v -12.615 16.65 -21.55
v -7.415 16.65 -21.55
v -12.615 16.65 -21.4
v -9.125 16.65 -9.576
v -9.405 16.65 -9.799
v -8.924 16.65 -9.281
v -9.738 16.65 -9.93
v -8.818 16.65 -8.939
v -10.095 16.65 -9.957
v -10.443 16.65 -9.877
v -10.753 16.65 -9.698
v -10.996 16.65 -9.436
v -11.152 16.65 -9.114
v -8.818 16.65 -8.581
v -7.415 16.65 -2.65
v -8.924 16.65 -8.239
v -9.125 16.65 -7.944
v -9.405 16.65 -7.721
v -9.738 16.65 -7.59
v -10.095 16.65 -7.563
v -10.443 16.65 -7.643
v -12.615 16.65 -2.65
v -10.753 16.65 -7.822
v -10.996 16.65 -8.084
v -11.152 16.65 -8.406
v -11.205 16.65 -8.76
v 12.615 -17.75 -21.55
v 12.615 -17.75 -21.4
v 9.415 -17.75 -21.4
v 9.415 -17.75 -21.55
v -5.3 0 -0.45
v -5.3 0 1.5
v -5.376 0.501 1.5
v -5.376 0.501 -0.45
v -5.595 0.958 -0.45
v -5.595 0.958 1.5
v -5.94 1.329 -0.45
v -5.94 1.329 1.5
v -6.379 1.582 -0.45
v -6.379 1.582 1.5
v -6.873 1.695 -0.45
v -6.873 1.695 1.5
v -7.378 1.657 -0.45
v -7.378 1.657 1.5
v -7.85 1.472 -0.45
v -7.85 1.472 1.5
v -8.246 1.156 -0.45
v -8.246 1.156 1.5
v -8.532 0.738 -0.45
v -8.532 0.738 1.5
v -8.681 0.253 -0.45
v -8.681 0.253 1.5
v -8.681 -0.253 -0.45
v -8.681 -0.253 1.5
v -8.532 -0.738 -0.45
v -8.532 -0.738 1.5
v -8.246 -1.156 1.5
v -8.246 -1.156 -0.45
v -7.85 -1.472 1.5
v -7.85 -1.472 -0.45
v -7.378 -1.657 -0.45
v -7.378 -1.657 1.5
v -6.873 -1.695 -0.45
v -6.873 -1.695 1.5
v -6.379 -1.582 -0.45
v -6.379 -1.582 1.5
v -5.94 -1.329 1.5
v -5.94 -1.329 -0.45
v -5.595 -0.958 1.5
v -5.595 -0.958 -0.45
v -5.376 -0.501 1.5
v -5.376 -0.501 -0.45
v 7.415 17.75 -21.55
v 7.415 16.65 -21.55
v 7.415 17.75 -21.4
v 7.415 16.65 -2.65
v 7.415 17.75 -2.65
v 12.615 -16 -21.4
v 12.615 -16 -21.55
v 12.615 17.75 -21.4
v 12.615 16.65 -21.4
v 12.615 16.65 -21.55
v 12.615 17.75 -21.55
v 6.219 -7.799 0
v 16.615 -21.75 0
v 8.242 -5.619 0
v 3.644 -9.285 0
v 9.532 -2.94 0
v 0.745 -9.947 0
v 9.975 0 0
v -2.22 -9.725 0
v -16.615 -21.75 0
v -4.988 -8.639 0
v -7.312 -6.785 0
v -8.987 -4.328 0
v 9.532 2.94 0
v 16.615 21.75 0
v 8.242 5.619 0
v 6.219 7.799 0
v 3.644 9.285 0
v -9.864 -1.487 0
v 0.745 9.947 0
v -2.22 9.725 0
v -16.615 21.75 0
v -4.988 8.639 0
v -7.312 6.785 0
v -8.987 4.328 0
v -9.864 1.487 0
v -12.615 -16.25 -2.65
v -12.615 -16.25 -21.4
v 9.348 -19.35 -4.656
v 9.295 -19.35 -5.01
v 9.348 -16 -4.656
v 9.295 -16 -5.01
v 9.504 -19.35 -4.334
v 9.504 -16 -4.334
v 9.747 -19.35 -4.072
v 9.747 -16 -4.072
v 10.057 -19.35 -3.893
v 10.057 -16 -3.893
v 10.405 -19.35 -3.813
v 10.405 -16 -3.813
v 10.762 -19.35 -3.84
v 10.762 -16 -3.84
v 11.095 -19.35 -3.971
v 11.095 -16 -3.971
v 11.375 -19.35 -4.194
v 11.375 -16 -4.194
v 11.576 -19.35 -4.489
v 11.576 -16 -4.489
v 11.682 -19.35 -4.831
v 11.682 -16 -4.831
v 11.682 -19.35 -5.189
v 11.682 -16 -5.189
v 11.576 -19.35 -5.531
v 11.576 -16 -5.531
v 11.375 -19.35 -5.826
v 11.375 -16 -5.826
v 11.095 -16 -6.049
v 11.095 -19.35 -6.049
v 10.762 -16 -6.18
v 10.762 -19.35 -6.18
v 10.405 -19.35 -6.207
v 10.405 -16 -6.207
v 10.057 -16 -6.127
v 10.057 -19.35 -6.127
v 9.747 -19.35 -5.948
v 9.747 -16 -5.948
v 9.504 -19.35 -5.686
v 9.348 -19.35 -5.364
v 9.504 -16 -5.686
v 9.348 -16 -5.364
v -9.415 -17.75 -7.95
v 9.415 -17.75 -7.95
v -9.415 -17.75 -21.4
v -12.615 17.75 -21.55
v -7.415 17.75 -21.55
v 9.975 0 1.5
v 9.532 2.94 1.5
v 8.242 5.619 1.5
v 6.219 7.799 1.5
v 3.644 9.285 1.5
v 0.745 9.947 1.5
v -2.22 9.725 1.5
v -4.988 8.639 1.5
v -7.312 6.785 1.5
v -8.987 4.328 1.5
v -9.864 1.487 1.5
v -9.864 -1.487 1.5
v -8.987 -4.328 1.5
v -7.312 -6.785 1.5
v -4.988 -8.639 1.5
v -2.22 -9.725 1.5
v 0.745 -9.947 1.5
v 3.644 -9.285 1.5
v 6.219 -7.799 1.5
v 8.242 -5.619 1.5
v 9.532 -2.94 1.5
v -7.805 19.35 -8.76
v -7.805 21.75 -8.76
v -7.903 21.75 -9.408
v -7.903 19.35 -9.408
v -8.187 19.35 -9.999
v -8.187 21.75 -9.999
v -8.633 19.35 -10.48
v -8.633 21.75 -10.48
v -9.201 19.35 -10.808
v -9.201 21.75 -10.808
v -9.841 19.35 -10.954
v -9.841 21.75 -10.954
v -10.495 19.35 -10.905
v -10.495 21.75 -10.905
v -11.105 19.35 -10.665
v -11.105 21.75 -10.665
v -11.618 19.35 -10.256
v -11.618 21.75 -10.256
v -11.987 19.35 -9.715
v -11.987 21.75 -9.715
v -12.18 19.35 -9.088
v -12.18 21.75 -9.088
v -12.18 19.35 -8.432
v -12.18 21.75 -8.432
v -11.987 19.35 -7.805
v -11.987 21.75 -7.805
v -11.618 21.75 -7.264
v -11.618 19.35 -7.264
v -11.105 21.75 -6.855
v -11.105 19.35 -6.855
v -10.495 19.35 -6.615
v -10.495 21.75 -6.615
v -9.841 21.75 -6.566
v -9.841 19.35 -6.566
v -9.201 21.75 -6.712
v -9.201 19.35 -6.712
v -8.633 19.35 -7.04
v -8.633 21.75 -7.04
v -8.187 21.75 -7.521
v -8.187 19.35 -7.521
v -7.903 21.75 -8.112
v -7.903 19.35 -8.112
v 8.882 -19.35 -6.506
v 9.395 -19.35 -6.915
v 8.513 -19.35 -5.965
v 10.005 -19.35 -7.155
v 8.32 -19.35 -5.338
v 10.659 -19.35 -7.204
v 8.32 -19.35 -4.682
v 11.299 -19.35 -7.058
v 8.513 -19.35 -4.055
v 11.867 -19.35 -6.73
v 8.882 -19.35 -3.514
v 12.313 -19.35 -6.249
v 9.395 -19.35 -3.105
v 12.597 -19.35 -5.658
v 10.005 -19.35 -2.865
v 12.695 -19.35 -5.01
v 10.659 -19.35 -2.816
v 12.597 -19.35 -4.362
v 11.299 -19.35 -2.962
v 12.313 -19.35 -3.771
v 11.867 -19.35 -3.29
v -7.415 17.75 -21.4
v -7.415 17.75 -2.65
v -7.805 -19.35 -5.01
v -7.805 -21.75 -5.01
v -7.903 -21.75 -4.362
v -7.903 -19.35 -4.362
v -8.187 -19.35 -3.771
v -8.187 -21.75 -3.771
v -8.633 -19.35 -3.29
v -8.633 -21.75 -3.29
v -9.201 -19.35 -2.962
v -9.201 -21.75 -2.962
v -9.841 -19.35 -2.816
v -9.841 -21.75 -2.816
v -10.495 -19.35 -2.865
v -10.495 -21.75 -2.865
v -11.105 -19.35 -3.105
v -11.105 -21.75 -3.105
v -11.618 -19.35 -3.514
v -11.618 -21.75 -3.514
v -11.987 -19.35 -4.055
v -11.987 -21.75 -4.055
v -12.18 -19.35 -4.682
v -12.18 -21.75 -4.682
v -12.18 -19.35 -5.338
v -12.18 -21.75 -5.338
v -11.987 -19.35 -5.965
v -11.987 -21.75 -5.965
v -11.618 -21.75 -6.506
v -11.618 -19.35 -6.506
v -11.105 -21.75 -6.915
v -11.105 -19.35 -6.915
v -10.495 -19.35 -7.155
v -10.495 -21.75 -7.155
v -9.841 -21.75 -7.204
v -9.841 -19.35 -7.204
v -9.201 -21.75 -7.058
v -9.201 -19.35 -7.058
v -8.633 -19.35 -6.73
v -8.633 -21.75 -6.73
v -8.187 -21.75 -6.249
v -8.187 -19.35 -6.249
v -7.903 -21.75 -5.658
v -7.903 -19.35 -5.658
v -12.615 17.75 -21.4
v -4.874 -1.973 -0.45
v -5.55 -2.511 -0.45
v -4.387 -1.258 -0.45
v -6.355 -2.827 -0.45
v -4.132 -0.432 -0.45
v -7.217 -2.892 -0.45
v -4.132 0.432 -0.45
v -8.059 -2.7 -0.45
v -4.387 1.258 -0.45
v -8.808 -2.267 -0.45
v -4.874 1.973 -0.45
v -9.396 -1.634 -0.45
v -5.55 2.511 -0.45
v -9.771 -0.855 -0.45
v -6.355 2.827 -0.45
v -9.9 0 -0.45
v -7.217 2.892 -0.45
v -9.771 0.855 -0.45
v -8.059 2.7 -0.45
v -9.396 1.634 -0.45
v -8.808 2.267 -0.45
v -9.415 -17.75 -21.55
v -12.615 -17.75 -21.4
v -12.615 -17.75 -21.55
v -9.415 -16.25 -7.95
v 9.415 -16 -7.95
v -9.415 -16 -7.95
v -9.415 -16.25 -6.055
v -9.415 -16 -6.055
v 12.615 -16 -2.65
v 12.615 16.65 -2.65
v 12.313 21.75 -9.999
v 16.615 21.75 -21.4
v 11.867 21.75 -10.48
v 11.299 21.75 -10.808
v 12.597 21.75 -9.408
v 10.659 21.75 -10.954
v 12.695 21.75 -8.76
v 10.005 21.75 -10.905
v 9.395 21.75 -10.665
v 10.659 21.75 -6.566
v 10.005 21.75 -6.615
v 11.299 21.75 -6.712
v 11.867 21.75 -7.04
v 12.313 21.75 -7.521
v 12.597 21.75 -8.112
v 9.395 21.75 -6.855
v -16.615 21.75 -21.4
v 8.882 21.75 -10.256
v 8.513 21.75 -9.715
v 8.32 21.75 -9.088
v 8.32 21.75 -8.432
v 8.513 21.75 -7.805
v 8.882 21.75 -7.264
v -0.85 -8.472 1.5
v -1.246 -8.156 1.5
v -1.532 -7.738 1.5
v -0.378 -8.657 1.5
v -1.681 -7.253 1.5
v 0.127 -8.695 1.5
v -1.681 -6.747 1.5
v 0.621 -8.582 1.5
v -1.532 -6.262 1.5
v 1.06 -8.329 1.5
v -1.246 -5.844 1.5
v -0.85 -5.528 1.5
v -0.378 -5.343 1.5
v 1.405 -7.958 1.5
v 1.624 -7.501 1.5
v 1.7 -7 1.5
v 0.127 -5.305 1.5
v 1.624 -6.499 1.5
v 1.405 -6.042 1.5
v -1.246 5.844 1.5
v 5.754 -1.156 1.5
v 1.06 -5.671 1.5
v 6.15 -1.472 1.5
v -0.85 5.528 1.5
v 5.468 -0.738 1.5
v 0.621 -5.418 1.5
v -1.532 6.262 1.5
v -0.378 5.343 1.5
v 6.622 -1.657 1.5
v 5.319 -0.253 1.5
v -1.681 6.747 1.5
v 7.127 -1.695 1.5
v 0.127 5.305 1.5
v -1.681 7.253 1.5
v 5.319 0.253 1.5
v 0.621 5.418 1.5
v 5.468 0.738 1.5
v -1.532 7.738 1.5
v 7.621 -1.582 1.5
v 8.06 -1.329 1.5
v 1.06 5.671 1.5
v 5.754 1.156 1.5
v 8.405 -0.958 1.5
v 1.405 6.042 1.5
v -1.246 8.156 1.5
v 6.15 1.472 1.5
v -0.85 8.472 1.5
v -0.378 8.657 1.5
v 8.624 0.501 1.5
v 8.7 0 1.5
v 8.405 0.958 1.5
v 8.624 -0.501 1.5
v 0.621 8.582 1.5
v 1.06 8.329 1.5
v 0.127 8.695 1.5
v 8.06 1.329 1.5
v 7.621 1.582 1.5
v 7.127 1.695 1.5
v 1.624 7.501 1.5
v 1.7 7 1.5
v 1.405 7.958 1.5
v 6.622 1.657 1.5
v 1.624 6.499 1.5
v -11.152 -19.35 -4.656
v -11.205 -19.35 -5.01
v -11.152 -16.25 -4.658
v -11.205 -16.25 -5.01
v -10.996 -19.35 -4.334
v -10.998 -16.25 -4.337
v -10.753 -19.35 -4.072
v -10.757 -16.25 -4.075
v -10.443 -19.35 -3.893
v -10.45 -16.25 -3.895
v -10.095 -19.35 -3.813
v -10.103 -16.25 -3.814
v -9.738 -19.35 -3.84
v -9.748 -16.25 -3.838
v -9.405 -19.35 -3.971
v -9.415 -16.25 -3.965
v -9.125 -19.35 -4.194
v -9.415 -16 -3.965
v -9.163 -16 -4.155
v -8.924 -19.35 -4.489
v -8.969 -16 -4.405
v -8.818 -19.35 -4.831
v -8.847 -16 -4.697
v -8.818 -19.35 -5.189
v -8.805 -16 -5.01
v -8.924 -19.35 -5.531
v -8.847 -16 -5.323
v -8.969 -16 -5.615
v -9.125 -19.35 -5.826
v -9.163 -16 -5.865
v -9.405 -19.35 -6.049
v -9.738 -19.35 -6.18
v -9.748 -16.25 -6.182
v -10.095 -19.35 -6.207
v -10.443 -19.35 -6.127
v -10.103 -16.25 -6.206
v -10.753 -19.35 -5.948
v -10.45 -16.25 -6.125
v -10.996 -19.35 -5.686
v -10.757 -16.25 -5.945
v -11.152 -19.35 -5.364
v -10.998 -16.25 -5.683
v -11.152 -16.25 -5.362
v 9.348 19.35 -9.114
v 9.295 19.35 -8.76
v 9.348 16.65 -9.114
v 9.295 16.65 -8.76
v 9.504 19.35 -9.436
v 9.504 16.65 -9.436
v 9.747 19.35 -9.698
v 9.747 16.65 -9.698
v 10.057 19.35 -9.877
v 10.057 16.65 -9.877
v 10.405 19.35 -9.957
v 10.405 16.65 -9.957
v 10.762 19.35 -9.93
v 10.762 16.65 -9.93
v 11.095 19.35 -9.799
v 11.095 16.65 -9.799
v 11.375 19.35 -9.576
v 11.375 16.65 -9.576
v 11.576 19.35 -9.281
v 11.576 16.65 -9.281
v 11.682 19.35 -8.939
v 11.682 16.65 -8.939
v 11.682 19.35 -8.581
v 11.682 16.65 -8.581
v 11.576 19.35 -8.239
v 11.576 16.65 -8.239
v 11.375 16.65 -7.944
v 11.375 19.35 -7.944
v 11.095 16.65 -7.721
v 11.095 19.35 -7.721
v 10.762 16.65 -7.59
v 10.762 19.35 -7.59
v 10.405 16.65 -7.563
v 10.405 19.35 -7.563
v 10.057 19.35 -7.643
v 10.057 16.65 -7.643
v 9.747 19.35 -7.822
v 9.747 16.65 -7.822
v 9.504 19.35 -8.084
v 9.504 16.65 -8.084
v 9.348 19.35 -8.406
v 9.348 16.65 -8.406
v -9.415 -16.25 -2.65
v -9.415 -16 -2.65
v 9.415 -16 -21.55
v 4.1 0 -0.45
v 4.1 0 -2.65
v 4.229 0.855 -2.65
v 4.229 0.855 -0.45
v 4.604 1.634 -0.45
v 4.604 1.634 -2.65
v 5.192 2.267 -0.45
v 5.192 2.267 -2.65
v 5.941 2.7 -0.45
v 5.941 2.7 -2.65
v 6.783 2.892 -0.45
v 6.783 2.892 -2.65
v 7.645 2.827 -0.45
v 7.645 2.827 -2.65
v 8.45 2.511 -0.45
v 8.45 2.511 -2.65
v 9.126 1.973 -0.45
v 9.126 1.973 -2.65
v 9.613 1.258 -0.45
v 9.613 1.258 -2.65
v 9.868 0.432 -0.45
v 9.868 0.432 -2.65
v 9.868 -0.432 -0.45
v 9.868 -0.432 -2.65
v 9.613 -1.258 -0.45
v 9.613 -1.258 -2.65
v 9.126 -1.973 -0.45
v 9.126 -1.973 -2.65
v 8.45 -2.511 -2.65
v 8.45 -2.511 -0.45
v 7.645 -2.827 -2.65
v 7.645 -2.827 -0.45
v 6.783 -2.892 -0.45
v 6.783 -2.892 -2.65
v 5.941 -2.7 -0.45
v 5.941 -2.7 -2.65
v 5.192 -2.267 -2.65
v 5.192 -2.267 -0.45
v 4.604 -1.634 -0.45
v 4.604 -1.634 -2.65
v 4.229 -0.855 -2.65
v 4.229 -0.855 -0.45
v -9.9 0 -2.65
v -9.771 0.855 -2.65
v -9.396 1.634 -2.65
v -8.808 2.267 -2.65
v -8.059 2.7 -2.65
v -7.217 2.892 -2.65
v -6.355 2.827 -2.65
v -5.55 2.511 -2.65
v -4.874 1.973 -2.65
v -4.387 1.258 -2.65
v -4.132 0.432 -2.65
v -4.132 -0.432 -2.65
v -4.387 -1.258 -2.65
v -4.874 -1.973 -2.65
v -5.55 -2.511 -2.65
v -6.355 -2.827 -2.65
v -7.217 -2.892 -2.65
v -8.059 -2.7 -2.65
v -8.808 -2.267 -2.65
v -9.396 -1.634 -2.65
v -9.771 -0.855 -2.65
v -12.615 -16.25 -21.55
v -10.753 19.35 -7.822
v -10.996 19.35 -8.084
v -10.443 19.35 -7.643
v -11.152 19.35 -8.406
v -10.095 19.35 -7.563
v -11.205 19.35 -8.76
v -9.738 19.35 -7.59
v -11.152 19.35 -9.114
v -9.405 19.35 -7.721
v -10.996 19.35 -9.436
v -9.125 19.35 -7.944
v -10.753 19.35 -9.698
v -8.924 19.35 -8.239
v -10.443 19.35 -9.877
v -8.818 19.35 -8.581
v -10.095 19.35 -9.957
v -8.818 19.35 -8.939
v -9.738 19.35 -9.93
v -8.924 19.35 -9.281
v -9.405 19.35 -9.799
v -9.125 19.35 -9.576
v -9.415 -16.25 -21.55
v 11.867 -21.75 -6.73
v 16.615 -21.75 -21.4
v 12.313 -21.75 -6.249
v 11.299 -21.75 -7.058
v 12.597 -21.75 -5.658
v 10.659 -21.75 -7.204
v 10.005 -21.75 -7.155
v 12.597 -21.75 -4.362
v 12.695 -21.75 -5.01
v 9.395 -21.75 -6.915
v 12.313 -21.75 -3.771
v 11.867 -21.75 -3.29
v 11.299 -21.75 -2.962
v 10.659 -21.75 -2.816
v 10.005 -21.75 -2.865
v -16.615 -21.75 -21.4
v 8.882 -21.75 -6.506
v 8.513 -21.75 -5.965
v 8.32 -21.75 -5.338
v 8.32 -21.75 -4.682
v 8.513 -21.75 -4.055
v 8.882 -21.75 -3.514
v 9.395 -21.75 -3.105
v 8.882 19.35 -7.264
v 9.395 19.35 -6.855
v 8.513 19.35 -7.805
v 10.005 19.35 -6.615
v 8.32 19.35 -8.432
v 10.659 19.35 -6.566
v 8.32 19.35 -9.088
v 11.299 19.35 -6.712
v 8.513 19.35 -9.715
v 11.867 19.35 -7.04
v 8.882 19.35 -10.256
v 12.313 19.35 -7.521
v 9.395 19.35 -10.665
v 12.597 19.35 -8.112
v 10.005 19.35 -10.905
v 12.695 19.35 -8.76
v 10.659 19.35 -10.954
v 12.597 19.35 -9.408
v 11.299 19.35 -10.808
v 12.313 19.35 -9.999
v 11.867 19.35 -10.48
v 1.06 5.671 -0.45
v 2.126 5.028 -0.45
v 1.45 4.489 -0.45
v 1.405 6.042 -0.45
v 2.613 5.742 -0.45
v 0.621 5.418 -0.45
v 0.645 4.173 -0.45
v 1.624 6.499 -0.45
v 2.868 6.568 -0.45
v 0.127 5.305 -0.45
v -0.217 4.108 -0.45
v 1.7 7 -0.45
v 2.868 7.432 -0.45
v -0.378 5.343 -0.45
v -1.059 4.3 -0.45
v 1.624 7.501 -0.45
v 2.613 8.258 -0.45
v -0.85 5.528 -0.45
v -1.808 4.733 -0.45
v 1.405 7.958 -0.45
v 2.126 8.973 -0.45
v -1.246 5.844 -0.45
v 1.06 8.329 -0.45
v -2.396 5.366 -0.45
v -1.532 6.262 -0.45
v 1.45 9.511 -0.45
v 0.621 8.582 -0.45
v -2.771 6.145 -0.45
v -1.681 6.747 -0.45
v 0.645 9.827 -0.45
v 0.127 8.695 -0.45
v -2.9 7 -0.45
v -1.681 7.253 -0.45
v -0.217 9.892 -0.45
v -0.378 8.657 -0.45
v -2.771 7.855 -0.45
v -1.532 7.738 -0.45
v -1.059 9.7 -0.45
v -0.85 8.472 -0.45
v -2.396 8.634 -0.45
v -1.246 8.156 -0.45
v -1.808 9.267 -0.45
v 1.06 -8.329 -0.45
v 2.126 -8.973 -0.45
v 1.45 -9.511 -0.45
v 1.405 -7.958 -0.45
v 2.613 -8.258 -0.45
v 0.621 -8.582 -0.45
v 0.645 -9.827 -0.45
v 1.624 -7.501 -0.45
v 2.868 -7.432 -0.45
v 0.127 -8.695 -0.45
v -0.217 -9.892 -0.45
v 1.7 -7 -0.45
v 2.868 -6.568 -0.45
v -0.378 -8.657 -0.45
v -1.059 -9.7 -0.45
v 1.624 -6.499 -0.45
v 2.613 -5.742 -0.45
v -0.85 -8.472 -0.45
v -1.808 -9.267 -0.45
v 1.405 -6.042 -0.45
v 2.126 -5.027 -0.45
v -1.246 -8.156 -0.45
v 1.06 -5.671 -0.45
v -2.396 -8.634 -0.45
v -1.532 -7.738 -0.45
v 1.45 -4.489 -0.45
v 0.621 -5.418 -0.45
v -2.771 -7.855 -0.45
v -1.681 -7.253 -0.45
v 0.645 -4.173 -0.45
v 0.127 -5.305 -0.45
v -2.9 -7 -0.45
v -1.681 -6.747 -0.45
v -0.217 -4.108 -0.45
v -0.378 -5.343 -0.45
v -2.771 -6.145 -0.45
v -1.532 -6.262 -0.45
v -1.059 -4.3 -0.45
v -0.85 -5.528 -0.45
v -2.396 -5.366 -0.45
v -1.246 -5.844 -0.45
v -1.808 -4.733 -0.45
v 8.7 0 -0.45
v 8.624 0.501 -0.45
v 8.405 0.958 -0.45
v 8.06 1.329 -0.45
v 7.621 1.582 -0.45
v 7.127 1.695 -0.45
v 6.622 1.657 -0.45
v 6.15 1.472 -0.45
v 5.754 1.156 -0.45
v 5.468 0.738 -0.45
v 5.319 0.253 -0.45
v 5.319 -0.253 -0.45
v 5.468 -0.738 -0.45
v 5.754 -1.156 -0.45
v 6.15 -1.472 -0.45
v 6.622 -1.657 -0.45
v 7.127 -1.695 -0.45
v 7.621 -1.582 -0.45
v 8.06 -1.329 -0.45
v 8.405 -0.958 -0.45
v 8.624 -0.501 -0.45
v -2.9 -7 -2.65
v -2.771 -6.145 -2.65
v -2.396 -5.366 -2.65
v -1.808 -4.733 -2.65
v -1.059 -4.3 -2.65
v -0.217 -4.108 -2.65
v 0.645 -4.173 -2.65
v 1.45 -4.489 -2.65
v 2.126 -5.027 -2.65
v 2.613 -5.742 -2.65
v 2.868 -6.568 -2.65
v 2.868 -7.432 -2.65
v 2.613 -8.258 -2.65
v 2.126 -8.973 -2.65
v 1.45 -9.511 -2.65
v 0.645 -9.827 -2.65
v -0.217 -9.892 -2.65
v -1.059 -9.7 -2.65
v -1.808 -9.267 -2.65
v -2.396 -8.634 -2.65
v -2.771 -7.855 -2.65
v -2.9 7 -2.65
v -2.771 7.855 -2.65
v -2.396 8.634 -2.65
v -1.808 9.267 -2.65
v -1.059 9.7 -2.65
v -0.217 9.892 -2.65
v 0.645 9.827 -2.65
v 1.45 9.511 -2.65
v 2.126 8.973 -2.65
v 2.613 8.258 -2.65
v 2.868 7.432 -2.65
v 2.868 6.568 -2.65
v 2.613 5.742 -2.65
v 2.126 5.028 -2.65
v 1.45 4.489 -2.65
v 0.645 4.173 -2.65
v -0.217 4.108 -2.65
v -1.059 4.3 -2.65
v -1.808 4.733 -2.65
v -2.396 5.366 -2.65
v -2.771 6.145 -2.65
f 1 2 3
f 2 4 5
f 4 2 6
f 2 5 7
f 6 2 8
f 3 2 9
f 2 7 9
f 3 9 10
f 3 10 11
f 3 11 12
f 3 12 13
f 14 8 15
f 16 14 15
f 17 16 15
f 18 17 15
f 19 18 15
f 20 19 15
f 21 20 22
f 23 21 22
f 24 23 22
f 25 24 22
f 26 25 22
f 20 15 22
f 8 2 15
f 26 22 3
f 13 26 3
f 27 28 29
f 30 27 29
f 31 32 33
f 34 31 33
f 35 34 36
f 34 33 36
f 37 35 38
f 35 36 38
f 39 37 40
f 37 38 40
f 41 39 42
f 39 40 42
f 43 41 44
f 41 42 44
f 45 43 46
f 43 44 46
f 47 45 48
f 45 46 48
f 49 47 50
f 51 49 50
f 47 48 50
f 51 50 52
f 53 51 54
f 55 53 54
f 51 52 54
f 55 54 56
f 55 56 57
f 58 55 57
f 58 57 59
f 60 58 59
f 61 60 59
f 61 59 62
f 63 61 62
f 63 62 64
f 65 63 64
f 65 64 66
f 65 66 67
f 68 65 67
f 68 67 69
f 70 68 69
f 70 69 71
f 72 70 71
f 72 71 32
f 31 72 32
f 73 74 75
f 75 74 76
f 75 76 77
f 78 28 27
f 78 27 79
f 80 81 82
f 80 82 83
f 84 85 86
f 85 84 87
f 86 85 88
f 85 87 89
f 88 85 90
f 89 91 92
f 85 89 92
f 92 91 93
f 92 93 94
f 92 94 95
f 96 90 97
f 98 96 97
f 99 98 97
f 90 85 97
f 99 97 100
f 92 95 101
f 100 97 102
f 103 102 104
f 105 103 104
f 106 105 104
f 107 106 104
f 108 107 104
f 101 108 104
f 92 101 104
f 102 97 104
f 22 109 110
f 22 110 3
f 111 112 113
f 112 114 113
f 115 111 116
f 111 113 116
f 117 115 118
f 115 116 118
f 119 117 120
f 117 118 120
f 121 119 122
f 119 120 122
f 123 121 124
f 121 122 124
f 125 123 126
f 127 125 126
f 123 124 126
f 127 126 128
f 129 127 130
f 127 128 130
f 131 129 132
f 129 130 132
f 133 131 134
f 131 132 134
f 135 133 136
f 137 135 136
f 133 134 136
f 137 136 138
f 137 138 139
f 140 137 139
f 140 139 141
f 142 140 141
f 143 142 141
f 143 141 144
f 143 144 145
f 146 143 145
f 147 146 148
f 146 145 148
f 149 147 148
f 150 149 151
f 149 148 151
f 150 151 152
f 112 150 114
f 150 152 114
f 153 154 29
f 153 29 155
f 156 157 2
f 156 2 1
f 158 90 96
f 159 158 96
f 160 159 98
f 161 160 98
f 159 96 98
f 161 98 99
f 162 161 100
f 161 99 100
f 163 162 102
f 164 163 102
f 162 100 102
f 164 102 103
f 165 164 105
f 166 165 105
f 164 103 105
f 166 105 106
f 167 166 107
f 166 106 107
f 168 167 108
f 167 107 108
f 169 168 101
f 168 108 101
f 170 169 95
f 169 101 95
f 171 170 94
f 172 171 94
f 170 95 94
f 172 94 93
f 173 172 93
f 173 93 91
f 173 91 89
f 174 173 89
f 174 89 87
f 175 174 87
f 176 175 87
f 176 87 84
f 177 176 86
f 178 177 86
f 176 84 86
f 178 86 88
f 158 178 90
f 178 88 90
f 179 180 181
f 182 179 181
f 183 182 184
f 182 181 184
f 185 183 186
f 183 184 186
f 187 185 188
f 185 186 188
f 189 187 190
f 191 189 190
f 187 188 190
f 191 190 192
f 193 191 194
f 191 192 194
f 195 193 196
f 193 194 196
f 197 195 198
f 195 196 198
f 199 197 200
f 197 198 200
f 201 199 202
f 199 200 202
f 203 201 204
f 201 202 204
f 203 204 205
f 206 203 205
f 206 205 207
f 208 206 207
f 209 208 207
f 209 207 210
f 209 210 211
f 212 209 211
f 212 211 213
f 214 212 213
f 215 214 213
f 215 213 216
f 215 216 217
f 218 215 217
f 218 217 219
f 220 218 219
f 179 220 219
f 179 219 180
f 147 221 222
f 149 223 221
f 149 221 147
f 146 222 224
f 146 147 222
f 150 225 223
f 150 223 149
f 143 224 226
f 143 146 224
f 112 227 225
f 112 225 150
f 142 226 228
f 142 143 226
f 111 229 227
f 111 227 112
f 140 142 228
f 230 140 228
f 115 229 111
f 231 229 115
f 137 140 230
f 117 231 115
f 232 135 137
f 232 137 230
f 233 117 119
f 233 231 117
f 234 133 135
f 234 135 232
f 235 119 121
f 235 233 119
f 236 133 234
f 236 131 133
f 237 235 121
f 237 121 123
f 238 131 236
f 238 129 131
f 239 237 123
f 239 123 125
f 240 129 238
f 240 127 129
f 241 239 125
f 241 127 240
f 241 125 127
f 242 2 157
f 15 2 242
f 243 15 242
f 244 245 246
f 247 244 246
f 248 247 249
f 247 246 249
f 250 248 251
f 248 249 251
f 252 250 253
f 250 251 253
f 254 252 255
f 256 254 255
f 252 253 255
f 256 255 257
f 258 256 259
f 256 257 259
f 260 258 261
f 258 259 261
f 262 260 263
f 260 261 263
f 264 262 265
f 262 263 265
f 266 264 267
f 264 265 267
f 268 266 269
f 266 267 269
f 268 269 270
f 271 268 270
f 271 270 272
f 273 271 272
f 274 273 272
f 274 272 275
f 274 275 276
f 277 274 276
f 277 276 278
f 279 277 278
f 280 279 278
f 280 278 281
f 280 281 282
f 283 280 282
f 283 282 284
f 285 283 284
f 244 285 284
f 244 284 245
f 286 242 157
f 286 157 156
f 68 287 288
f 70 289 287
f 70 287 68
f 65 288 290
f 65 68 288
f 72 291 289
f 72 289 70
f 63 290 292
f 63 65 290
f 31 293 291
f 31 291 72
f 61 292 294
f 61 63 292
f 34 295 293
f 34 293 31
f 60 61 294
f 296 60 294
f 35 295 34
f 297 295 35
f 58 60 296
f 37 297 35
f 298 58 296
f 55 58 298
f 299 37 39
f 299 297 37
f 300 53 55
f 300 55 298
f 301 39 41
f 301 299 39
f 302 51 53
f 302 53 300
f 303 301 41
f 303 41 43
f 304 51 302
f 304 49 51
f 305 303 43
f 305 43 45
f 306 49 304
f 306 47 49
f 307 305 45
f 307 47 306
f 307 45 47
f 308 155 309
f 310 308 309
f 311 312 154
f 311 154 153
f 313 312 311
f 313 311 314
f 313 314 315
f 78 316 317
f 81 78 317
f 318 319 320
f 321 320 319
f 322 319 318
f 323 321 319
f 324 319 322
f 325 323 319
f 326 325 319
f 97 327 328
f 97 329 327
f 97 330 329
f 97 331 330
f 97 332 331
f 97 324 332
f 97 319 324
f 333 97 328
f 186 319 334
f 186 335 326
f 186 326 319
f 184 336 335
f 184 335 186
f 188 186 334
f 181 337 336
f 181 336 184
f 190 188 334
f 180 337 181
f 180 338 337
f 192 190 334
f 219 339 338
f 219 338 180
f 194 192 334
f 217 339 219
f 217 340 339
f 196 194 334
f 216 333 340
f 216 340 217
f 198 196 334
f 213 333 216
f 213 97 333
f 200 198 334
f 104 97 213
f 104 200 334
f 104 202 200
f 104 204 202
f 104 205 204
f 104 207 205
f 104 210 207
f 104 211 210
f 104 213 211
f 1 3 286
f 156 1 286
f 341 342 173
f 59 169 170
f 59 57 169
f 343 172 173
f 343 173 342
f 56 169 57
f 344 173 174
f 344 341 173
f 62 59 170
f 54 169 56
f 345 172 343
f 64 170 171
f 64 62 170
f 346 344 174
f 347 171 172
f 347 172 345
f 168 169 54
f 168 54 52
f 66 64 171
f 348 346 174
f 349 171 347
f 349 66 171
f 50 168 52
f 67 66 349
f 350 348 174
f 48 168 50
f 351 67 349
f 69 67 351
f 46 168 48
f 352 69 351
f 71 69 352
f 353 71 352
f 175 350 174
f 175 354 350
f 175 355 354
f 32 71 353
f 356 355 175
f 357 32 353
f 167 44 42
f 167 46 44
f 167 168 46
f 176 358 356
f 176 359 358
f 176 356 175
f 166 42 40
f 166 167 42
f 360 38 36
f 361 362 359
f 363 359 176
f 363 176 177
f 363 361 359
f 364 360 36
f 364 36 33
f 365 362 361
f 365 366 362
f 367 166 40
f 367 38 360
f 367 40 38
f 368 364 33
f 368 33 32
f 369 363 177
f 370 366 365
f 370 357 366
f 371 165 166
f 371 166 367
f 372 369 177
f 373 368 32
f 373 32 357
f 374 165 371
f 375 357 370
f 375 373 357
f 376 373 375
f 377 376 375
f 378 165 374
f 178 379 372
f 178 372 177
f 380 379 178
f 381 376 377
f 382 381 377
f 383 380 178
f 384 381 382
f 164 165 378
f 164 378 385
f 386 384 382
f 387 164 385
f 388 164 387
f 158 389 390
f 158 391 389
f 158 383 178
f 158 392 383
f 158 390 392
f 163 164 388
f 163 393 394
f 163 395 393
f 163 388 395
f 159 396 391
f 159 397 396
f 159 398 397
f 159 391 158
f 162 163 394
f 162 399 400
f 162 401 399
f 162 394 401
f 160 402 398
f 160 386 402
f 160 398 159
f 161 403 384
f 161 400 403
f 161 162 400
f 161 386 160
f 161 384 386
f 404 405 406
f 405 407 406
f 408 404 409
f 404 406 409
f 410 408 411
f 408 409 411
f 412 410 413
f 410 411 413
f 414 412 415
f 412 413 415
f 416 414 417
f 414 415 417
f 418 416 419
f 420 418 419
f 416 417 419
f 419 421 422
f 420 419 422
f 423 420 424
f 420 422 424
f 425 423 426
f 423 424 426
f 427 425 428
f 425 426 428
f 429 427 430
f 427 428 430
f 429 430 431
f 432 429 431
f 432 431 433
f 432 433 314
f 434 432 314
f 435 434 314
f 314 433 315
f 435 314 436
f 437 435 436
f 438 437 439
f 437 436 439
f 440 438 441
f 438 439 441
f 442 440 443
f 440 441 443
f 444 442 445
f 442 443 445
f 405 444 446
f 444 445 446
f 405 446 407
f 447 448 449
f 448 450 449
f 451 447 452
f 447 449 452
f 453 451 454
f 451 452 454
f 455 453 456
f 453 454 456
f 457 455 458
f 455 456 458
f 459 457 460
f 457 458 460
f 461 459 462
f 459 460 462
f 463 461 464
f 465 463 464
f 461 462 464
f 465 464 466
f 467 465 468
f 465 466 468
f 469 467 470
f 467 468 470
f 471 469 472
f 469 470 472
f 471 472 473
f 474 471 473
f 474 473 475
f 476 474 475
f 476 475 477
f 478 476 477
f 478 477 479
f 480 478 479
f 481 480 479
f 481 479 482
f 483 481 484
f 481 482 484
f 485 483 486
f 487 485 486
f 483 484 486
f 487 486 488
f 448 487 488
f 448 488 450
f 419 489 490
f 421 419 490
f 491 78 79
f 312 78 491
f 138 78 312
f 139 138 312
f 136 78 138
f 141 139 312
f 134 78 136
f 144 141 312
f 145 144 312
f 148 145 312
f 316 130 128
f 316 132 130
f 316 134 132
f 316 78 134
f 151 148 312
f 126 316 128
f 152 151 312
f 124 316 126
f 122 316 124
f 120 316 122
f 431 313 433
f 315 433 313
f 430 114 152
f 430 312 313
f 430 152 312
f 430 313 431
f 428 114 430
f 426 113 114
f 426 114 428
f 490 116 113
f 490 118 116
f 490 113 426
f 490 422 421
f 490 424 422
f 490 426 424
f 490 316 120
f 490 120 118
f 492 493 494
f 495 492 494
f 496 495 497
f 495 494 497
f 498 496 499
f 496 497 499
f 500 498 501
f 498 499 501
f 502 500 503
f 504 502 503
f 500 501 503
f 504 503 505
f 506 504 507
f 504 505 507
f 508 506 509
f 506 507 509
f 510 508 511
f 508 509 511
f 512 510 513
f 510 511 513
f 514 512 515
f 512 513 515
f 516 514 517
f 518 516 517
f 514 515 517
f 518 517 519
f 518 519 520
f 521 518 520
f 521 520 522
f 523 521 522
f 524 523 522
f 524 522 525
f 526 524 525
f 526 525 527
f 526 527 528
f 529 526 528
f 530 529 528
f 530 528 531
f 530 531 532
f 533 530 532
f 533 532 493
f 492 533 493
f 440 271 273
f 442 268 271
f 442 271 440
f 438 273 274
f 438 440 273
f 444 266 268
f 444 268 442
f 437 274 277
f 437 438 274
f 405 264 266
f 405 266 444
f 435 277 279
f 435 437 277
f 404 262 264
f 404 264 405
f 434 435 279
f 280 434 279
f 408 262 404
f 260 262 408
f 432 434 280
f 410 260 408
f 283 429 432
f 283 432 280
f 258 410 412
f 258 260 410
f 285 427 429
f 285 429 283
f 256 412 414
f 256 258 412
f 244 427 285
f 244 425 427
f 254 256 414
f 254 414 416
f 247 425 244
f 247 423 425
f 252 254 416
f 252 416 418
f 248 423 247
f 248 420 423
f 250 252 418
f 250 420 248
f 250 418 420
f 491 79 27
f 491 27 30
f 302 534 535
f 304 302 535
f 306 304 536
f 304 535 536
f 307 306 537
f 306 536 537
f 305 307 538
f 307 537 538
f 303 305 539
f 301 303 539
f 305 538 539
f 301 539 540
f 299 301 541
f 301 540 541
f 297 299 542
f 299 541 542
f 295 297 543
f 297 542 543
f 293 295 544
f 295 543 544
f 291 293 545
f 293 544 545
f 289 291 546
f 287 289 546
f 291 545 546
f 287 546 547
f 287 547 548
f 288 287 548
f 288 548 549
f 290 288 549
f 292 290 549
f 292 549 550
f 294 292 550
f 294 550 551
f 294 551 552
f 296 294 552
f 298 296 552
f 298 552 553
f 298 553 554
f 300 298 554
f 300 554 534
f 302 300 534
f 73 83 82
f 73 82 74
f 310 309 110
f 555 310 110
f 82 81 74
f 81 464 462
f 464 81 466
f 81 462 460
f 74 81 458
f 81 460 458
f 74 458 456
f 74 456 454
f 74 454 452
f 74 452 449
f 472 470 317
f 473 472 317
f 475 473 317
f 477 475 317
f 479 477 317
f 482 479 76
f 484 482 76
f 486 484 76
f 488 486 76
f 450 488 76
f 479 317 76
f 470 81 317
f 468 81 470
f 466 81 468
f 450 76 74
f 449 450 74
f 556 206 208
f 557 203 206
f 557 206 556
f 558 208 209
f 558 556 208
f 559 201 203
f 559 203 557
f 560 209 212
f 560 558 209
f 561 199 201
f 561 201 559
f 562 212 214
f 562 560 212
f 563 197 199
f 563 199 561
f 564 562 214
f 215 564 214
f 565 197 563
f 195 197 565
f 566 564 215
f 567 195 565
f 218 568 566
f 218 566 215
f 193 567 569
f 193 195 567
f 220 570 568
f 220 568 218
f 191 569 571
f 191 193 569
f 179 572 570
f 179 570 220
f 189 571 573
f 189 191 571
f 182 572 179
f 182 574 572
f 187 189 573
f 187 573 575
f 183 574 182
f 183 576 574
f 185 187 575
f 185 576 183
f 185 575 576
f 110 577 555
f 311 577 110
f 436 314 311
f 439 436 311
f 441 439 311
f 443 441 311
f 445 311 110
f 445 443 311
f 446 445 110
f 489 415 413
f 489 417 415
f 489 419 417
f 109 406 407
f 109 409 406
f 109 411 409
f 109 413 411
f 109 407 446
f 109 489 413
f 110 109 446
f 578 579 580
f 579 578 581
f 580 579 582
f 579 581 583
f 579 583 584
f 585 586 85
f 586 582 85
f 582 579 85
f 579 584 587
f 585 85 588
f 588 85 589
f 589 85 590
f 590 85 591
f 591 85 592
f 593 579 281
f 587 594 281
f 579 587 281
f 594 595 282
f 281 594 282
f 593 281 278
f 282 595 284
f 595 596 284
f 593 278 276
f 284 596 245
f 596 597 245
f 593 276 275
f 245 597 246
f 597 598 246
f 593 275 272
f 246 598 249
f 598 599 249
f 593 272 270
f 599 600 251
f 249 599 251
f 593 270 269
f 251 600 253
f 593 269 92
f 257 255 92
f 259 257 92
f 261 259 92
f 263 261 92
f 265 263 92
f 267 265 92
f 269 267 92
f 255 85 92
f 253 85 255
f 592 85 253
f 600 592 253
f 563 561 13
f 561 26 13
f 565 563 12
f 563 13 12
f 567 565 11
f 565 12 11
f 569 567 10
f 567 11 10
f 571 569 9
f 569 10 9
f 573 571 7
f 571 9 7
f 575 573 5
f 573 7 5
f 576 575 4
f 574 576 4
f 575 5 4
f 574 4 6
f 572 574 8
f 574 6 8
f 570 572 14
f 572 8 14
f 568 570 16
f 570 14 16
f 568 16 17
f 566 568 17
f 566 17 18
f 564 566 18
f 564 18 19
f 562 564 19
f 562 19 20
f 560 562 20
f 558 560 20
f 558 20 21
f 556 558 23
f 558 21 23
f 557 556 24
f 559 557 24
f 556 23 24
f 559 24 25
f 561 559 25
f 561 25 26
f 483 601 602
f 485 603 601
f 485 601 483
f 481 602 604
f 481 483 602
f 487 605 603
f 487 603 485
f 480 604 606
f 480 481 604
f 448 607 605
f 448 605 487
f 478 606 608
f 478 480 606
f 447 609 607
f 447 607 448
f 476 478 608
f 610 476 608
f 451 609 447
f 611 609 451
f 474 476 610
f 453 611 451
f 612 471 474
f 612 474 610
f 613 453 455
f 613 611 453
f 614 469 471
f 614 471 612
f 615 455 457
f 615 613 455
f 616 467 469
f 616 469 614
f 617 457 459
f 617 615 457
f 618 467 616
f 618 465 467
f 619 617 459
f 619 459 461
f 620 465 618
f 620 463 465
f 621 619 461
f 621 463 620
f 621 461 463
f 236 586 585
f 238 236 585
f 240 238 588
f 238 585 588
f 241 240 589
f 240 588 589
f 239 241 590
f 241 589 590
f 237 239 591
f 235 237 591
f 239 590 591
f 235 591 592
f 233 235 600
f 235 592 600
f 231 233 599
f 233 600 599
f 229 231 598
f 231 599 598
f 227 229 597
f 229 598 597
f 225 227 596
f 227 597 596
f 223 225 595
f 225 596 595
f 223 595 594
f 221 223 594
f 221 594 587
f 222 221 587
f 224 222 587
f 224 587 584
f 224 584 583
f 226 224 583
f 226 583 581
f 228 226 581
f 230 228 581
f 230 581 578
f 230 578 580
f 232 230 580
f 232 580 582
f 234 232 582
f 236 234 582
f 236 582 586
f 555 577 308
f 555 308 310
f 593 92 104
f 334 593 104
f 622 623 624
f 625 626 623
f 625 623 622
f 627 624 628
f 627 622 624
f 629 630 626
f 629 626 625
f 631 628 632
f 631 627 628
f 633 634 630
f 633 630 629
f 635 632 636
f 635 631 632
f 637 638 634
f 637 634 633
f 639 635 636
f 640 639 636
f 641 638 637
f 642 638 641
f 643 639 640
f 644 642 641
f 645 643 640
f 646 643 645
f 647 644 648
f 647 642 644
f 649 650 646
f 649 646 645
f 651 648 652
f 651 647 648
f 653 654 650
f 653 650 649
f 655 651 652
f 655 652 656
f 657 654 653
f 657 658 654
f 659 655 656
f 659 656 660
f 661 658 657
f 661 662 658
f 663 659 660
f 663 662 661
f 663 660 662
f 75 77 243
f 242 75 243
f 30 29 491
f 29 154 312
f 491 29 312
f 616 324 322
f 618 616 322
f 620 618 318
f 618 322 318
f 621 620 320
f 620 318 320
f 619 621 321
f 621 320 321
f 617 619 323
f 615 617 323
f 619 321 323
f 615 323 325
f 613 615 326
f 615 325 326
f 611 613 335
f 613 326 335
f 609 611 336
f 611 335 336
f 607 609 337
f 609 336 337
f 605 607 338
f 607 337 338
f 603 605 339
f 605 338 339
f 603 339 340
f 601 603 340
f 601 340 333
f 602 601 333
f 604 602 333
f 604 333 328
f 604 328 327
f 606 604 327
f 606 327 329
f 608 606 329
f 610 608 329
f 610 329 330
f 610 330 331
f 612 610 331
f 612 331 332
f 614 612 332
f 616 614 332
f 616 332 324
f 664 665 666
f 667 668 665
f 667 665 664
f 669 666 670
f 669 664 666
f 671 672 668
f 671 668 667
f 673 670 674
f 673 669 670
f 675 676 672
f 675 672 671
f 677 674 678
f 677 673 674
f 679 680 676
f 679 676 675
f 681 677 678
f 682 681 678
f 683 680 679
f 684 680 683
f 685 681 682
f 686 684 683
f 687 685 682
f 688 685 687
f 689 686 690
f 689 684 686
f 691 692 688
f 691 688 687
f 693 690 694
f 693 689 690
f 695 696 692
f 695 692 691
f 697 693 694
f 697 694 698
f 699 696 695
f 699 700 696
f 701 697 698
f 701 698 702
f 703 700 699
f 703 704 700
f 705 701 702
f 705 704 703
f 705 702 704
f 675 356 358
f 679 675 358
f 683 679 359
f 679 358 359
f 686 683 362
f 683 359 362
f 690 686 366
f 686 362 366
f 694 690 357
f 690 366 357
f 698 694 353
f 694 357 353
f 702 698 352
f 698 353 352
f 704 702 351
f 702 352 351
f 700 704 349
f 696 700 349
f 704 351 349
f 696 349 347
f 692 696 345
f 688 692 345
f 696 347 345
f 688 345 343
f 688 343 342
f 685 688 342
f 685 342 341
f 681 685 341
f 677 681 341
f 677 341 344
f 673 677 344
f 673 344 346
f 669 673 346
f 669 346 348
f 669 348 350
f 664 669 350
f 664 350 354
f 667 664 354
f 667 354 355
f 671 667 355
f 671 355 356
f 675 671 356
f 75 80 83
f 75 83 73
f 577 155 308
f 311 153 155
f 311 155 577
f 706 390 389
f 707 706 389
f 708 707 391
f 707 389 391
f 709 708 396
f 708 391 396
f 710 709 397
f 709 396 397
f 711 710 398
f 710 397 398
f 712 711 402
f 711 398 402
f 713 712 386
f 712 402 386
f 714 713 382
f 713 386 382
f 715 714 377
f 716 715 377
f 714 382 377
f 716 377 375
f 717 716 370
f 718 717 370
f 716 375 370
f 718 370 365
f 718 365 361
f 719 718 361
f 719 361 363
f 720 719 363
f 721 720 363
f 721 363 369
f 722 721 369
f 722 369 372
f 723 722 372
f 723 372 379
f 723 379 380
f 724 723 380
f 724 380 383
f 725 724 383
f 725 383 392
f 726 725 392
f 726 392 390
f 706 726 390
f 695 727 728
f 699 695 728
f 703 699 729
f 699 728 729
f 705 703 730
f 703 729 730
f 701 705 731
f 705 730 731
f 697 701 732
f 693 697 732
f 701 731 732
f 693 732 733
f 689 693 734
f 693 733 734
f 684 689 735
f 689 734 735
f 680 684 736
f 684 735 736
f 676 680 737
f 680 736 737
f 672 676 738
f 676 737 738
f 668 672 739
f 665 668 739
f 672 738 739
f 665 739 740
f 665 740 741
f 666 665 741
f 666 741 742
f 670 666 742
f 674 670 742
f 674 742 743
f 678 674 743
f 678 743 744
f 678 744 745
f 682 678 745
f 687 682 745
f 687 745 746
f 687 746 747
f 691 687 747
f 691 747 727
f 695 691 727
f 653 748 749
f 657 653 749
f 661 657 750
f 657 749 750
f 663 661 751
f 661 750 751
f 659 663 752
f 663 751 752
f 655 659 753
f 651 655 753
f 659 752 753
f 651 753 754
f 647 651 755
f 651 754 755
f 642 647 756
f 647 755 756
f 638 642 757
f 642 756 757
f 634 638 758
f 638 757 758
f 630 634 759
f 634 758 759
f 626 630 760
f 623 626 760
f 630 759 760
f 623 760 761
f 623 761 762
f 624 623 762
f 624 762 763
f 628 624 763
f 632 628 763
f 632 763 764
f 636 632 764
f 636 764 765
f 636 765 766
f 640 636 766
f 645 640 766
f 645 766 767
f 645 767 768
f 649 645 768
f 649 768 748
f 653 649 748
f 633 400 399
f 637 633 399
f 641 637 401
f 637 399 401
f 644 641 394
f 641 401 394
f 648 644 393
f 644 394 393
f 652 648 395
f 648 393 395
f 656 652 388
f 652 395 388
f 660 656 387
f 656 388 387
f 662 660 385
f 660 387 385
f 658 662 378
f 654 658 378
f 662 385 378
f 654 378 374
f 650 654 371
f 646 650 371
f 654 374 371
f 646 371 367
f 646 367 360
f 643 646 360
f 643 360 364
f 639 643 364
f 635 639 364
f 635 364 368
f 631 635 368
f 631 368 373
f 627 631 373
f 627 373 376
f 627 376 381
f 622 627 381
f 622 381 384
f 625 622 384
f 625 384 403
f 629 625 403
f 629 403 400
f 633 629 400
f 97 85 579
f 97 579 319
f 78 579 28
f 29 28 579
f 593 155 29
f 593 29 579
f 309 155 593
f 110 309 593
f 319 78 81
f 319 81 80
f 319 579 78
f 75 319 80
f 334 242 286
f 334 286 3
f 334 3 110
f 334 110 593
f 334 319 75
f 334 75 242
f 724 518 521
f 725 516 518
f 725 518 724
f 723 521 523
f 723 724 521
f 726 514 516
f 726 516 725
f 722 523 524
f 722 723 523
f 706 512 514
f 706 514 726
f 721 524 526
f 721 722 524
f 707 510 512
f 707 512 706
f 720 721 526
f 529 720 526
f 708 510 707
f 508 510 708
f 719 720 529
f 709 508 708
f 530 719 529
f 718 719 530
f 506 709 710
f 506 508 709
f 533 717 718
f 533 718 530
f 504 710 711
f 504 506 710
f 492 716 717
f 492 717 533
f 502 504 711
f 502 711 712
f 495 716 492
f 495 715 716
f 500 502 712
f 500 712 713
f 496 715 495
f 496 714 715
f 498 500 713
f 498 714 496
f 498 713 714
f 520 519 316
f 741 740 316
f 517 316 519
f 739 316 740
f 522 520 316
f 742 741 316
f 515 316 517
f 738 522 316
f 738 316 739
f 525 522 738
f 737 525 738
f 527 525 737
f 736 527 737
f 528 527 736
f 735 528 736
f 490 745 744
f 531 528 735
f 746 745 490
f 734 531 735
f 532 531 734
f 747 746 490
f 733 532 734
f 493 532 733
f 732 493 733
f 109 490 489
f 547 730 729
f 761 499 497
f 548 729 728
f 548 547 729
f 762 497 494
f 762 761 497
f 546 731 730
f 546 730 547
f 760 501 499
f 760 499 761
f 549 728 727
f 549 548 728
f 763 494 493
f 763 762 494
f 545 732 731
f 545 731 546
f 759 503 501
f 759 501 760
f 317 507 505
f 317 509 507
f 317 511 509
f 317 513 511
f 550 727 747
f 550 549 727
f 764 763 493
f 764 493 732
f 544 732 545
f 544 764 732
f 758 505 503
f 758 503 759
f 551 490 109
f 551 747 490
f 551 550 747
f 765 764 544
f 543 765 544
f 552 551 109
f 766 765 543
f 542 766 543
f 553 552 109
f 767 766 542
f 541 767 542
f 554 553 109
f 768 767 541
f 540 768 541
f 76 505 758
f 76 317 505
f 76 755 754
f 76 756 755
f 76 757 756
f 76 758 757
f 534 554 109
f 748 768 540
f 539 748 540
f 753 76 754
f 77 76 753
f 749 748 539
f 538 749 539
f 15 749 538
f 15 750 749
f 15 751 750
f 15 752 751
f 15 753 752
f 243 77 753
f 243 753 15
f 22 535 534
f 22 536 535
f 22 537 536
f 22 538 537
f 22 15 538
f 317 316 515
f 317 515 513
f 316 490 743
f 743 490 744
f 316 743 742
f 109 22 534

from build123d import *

# Parameters (mm, degrees)
SKETCH1_R                                           = 9.975
BOSS_EXTRUDE1_DEPTH                                 = 1.5
SKETCH3_W                                           = 25.23
SKETCH3_H                                           = 35.5
BOSS_EXTRUDE4_DEPTH                                 = 2.65
SKETCH3_5_W                                         = 33.23
SKETCH3_5_H                                         = 43.5
SKETCH3_5_W_2                                       = 25.23
SKETCH3_5_H_2                                       = 35.5
BOSS_EXTRUDE5_DEPTH                                 = 21.4
SKETCH4_W                                           = 5.2
SKETCH4_H                                           = 1.1
SKETCH4_W_2                                         = 3.2
SKETCH4_H_2                                         = 1.5
SKETCH4_H_3                                         = 1.75
BOSS_EXTRUDE6_DEPTH                                 = 18.9
SKETCH6_W                                           = 18.83
SKETCH6_H                                           = 1.75
BOSS_EXTRUDE7_DEPTH                                 = 5.3
SKETCH2_R                                           = 1.6
CUT_EXTRUDE1_DEPTH                                  = 37
CBORE_FOR_M3_HEX_SOCKET_HEAD_CAP_SCREW1_D           = 3.4
CBORE_FOR_M3_HEX_SOCKET_HEAD_CAP_SCREW1_DEPTH       = 4.15
CBORE_FOR_M3_HEX_SOCKET_HEAD_CAP_SCREW1_CBORE_D     = 5.8
CBORE_FOR_M3_HEX_SOCKET_HEAD_CAP_SCREW1_CBORE_DEPTH = 2.2
CBORE_FOR_M2_HEX_SOCKET_HEAD_CAP_SCREW1_D           = 2.4
CBORE_FOR_M2_HEX_SOCKET_HEAD_CAP_SCREW1_DEPTH       = 6.5
CBORE_FOR_M2_HEX_SOCKET_HEAD_CAP_SCREW1_CBORE_D     = 4.4
CBORE_FOR_M2_HEX_SOCKET_HEAD_CAP_SCREW1_CBORE_DEPTH = 2.4
CBORE_FOR_M2_HEX_SOCKET_HEAD_CAP_SCREW1_TIP         = 0.721032743
CBORE_FOR_M2_HEX_SOCKET_HEAD_CAP_SCREW2_D           = 2.4
CBORE_FOR_M2_HEX_SOCKET_HEAD_CAP_SCREW2_DEPTH       = 6.5
CBORE_FOR_M2_HEX_SOCKET_HEAD_CAP_SCREW2_CBORE_D     = 4.4
CBORE_FOR_M2_HEX_SOCKET_HEAD_CAP_SCREW2_CBORE_DEPTH = 2.4
CBORE_FOR_M2_HEX_SOCKET_HEAD_CAP_SCREW2_TIP         = 0.721032743


with BuildPart() as part:
    # Sketch1 → Boss-Extrude1 (new body)
    with BuildSketch(Plane.XY):
        Circle(SKETCH1_R)
    extrude(amount=BOSS_EXTRUDE1_DEPTH)

    # Sketch3 → Boss-Extrude4 (add)
    with BuildSketch(Plane(origin=(0, 0, 0), x_dir=(-1, 0, 0), z_dir=(0, 0, -1))):
        Rectangle(SKETCH3_W, SKETCH3_H)
    extrude(amount=BOSS_EXTRUDE4_DEPTH)

    # Sketch3<5> → Boss-Extrude5 (add)
    with BuildSketch(Plane(origin=(0, 0, 0), x_dir=(-1, 0, 0), z_dir=(0, 0, -1))):
        Rectangle(SKETCH3_5_W, SKETCH3_5_H)
        Rectangle(SKETCH3_5_W_2, SKETCH3_5_H_2, mode=Mode.SUBTRACT)
    extrude(amount=BOSS_EXTRUDE5_DEPTH)

    # Sketch4 → Boss-Extrude6 (add)
    with BuildSketch(Plane(origin=(0, 0, -2.65), x_dir=(-1, 0, 0), z_dir=(0, 0, -1))):
        with Locations((10.015, 17.2)):
            Rectangle(SKETCH4_W, SKETCH4_H)
        with Locations((-10.015, 17.2)):
            Rectangle(SKETCH4_W, SKETCH4_H)
        with Locations((11.015, -17)):
            Rectangle(SKETCH4_W_2, SKETCH4_H_2)
        with Locations((-11.015, -16.875)):
            Rectangle(SKETCH4_W_2, SKETCH4_H_3)
    extrude(amount=BOSS_EXTRUDE6_DEPTH)

    # Sketch6 → Boss-Extrude7 (add)
    with BuildSketch(Plane(origin=(0, 0, -2.65), x_dir=(-1, 0, 0), z_dir=(0, 0, -1))):
        with Locations((0, -16.875)):
            Rectangle(SKETCH6_W, SKETCH6_H)
    extrude(amount=BOSS_EXTRUDE7_DEPTH)

    # Sketch2 → Cut-Extrude1 (cut)
    with BuildSketch(Plane.XY.offset(1.5)):
        with Locations((7, 0)):
            Circle(SKETCH2_R)
        with Locations((0, -7)):
            Circle(SKETCH2_R)
        with Locations((-7, 0)):
            Circle(SKETCH2_R)
        with Locations((0, 7)):
            Circle(SKETCH2_R)
    extrude(amount=-CUT_EXTRUDE1_DEPTH, mode=Mode.SUBTRACT)

    # CBORE for M3 Hex Socket Head Cap Screw1
    with Locations(Plane(origin=(0, 0, -2.65), x_dir=(-1, 0, 0), z_dir=(0, 0, -1))):
        with Locations((0, 7.000001873), (-7.000001873, 0), (0, -7), (7, 0)):
            CounterBoreHole(CBORE_FOR_M3_HEX_SOCKET_HEAD_CAP_SCREW1_D / 2, CBORE_FOR_M3_HEX_SOCKET_HEAD_CAP_SCREW1_CBORE_D / 2, CBORE_FOR_M3_HEX_SOCKET_HEAD_CAP_SCREW1_CBORE_DEPTH, depth=CBORE_FOR_M3_HEX_SOCKET_HEAD_CAP_SCREW1_DEPTH)

    # CBORE for M2 Hex Socket Head Cap Screw1
    with Locations(Plane.XZ.offset(21.75)):
        with Locations((-10.005, -5.01), (10.495, -5.01)):
            CounterBoreHole(CBORE_FOR_M2_HEX_SOCKET_HEAD_CAP_SCREW1_D / 2, CBORE_FOR_M2_HEX_SOCKET_HEAD_CAP_SCREW1_CBORE_D / 2, CBORE_FOR_M2_HEX_SOCKET_HEAD_CAP_SCREW1_CBORE_DEPTH, depth=CBORE_FOR_M2_HEX_SOCKET_HEAD_CAP_SCREW1_DEPTH)
            with Locations((0, 0, -(CBORE_FOR_M2_HEX_SOCKET_HEAD_CAP_SCREW1_DEPTH + CBORE_FOR_M2_HEX_SOCKET_HEAD_CAP_SCREW1_TIP / 2))):  # 118° drill point
                Cone(0, CBORE_FOR_M2_HEX_SOCKET_HEAD_CAP_SCREW1_D / 2, CBORE_FOR_M2_HEX_SOCKET_HEAD_CAP_SCREW1_TIP, mode=Mode.SUBTRACT)

    # CBORE for M2 Hex Socket Head Cap Screw2
    with Locations(Plane(origin=(0, 21.75, 0), x_dir=(1, 0, 0), z_dir=(0, 1, 0))):
        with Locations((-10.005, 8.76), (10.495, 8.76)):
            CounterBoreHole(CBORE_FOR_M2_HEX_SOCKET_HEAD_CAP_SCREW2_D / 2, CBORE_FOR_M2_HEX_SOCKET_HEAD_CAP_SCREW2_CBORE_D / 2, CBORE_FOR_M2_HEX_SOCKET_HEAD_CAP_SCREW2_CBORE_DEPTH, depth=CBORE_FOR_M2_HEX_SOCKET_HEAD_CAP_SCREW2_DEPTH)
            with Locations((0, 0, -(CBORE_FOR_M2_HEX_SOCKET_HEAD_CAP_SCREW2_DEPTH + CBORE_FOR_M2_HEX_SOCKET_HEAD_CAP_SCREW2_TIP / 2))):  # 118° drill point
                Cone(0, CBORE_FOR_M2_HEX_SOCKET_HEAD_CAP_SCREW2_D / 2, CBORE_FOR_M2_HEX_SOCKET_HEAD_CAP_SCREW2_TIP, mode=Mode.SUBTRACT)


solid = part.part
